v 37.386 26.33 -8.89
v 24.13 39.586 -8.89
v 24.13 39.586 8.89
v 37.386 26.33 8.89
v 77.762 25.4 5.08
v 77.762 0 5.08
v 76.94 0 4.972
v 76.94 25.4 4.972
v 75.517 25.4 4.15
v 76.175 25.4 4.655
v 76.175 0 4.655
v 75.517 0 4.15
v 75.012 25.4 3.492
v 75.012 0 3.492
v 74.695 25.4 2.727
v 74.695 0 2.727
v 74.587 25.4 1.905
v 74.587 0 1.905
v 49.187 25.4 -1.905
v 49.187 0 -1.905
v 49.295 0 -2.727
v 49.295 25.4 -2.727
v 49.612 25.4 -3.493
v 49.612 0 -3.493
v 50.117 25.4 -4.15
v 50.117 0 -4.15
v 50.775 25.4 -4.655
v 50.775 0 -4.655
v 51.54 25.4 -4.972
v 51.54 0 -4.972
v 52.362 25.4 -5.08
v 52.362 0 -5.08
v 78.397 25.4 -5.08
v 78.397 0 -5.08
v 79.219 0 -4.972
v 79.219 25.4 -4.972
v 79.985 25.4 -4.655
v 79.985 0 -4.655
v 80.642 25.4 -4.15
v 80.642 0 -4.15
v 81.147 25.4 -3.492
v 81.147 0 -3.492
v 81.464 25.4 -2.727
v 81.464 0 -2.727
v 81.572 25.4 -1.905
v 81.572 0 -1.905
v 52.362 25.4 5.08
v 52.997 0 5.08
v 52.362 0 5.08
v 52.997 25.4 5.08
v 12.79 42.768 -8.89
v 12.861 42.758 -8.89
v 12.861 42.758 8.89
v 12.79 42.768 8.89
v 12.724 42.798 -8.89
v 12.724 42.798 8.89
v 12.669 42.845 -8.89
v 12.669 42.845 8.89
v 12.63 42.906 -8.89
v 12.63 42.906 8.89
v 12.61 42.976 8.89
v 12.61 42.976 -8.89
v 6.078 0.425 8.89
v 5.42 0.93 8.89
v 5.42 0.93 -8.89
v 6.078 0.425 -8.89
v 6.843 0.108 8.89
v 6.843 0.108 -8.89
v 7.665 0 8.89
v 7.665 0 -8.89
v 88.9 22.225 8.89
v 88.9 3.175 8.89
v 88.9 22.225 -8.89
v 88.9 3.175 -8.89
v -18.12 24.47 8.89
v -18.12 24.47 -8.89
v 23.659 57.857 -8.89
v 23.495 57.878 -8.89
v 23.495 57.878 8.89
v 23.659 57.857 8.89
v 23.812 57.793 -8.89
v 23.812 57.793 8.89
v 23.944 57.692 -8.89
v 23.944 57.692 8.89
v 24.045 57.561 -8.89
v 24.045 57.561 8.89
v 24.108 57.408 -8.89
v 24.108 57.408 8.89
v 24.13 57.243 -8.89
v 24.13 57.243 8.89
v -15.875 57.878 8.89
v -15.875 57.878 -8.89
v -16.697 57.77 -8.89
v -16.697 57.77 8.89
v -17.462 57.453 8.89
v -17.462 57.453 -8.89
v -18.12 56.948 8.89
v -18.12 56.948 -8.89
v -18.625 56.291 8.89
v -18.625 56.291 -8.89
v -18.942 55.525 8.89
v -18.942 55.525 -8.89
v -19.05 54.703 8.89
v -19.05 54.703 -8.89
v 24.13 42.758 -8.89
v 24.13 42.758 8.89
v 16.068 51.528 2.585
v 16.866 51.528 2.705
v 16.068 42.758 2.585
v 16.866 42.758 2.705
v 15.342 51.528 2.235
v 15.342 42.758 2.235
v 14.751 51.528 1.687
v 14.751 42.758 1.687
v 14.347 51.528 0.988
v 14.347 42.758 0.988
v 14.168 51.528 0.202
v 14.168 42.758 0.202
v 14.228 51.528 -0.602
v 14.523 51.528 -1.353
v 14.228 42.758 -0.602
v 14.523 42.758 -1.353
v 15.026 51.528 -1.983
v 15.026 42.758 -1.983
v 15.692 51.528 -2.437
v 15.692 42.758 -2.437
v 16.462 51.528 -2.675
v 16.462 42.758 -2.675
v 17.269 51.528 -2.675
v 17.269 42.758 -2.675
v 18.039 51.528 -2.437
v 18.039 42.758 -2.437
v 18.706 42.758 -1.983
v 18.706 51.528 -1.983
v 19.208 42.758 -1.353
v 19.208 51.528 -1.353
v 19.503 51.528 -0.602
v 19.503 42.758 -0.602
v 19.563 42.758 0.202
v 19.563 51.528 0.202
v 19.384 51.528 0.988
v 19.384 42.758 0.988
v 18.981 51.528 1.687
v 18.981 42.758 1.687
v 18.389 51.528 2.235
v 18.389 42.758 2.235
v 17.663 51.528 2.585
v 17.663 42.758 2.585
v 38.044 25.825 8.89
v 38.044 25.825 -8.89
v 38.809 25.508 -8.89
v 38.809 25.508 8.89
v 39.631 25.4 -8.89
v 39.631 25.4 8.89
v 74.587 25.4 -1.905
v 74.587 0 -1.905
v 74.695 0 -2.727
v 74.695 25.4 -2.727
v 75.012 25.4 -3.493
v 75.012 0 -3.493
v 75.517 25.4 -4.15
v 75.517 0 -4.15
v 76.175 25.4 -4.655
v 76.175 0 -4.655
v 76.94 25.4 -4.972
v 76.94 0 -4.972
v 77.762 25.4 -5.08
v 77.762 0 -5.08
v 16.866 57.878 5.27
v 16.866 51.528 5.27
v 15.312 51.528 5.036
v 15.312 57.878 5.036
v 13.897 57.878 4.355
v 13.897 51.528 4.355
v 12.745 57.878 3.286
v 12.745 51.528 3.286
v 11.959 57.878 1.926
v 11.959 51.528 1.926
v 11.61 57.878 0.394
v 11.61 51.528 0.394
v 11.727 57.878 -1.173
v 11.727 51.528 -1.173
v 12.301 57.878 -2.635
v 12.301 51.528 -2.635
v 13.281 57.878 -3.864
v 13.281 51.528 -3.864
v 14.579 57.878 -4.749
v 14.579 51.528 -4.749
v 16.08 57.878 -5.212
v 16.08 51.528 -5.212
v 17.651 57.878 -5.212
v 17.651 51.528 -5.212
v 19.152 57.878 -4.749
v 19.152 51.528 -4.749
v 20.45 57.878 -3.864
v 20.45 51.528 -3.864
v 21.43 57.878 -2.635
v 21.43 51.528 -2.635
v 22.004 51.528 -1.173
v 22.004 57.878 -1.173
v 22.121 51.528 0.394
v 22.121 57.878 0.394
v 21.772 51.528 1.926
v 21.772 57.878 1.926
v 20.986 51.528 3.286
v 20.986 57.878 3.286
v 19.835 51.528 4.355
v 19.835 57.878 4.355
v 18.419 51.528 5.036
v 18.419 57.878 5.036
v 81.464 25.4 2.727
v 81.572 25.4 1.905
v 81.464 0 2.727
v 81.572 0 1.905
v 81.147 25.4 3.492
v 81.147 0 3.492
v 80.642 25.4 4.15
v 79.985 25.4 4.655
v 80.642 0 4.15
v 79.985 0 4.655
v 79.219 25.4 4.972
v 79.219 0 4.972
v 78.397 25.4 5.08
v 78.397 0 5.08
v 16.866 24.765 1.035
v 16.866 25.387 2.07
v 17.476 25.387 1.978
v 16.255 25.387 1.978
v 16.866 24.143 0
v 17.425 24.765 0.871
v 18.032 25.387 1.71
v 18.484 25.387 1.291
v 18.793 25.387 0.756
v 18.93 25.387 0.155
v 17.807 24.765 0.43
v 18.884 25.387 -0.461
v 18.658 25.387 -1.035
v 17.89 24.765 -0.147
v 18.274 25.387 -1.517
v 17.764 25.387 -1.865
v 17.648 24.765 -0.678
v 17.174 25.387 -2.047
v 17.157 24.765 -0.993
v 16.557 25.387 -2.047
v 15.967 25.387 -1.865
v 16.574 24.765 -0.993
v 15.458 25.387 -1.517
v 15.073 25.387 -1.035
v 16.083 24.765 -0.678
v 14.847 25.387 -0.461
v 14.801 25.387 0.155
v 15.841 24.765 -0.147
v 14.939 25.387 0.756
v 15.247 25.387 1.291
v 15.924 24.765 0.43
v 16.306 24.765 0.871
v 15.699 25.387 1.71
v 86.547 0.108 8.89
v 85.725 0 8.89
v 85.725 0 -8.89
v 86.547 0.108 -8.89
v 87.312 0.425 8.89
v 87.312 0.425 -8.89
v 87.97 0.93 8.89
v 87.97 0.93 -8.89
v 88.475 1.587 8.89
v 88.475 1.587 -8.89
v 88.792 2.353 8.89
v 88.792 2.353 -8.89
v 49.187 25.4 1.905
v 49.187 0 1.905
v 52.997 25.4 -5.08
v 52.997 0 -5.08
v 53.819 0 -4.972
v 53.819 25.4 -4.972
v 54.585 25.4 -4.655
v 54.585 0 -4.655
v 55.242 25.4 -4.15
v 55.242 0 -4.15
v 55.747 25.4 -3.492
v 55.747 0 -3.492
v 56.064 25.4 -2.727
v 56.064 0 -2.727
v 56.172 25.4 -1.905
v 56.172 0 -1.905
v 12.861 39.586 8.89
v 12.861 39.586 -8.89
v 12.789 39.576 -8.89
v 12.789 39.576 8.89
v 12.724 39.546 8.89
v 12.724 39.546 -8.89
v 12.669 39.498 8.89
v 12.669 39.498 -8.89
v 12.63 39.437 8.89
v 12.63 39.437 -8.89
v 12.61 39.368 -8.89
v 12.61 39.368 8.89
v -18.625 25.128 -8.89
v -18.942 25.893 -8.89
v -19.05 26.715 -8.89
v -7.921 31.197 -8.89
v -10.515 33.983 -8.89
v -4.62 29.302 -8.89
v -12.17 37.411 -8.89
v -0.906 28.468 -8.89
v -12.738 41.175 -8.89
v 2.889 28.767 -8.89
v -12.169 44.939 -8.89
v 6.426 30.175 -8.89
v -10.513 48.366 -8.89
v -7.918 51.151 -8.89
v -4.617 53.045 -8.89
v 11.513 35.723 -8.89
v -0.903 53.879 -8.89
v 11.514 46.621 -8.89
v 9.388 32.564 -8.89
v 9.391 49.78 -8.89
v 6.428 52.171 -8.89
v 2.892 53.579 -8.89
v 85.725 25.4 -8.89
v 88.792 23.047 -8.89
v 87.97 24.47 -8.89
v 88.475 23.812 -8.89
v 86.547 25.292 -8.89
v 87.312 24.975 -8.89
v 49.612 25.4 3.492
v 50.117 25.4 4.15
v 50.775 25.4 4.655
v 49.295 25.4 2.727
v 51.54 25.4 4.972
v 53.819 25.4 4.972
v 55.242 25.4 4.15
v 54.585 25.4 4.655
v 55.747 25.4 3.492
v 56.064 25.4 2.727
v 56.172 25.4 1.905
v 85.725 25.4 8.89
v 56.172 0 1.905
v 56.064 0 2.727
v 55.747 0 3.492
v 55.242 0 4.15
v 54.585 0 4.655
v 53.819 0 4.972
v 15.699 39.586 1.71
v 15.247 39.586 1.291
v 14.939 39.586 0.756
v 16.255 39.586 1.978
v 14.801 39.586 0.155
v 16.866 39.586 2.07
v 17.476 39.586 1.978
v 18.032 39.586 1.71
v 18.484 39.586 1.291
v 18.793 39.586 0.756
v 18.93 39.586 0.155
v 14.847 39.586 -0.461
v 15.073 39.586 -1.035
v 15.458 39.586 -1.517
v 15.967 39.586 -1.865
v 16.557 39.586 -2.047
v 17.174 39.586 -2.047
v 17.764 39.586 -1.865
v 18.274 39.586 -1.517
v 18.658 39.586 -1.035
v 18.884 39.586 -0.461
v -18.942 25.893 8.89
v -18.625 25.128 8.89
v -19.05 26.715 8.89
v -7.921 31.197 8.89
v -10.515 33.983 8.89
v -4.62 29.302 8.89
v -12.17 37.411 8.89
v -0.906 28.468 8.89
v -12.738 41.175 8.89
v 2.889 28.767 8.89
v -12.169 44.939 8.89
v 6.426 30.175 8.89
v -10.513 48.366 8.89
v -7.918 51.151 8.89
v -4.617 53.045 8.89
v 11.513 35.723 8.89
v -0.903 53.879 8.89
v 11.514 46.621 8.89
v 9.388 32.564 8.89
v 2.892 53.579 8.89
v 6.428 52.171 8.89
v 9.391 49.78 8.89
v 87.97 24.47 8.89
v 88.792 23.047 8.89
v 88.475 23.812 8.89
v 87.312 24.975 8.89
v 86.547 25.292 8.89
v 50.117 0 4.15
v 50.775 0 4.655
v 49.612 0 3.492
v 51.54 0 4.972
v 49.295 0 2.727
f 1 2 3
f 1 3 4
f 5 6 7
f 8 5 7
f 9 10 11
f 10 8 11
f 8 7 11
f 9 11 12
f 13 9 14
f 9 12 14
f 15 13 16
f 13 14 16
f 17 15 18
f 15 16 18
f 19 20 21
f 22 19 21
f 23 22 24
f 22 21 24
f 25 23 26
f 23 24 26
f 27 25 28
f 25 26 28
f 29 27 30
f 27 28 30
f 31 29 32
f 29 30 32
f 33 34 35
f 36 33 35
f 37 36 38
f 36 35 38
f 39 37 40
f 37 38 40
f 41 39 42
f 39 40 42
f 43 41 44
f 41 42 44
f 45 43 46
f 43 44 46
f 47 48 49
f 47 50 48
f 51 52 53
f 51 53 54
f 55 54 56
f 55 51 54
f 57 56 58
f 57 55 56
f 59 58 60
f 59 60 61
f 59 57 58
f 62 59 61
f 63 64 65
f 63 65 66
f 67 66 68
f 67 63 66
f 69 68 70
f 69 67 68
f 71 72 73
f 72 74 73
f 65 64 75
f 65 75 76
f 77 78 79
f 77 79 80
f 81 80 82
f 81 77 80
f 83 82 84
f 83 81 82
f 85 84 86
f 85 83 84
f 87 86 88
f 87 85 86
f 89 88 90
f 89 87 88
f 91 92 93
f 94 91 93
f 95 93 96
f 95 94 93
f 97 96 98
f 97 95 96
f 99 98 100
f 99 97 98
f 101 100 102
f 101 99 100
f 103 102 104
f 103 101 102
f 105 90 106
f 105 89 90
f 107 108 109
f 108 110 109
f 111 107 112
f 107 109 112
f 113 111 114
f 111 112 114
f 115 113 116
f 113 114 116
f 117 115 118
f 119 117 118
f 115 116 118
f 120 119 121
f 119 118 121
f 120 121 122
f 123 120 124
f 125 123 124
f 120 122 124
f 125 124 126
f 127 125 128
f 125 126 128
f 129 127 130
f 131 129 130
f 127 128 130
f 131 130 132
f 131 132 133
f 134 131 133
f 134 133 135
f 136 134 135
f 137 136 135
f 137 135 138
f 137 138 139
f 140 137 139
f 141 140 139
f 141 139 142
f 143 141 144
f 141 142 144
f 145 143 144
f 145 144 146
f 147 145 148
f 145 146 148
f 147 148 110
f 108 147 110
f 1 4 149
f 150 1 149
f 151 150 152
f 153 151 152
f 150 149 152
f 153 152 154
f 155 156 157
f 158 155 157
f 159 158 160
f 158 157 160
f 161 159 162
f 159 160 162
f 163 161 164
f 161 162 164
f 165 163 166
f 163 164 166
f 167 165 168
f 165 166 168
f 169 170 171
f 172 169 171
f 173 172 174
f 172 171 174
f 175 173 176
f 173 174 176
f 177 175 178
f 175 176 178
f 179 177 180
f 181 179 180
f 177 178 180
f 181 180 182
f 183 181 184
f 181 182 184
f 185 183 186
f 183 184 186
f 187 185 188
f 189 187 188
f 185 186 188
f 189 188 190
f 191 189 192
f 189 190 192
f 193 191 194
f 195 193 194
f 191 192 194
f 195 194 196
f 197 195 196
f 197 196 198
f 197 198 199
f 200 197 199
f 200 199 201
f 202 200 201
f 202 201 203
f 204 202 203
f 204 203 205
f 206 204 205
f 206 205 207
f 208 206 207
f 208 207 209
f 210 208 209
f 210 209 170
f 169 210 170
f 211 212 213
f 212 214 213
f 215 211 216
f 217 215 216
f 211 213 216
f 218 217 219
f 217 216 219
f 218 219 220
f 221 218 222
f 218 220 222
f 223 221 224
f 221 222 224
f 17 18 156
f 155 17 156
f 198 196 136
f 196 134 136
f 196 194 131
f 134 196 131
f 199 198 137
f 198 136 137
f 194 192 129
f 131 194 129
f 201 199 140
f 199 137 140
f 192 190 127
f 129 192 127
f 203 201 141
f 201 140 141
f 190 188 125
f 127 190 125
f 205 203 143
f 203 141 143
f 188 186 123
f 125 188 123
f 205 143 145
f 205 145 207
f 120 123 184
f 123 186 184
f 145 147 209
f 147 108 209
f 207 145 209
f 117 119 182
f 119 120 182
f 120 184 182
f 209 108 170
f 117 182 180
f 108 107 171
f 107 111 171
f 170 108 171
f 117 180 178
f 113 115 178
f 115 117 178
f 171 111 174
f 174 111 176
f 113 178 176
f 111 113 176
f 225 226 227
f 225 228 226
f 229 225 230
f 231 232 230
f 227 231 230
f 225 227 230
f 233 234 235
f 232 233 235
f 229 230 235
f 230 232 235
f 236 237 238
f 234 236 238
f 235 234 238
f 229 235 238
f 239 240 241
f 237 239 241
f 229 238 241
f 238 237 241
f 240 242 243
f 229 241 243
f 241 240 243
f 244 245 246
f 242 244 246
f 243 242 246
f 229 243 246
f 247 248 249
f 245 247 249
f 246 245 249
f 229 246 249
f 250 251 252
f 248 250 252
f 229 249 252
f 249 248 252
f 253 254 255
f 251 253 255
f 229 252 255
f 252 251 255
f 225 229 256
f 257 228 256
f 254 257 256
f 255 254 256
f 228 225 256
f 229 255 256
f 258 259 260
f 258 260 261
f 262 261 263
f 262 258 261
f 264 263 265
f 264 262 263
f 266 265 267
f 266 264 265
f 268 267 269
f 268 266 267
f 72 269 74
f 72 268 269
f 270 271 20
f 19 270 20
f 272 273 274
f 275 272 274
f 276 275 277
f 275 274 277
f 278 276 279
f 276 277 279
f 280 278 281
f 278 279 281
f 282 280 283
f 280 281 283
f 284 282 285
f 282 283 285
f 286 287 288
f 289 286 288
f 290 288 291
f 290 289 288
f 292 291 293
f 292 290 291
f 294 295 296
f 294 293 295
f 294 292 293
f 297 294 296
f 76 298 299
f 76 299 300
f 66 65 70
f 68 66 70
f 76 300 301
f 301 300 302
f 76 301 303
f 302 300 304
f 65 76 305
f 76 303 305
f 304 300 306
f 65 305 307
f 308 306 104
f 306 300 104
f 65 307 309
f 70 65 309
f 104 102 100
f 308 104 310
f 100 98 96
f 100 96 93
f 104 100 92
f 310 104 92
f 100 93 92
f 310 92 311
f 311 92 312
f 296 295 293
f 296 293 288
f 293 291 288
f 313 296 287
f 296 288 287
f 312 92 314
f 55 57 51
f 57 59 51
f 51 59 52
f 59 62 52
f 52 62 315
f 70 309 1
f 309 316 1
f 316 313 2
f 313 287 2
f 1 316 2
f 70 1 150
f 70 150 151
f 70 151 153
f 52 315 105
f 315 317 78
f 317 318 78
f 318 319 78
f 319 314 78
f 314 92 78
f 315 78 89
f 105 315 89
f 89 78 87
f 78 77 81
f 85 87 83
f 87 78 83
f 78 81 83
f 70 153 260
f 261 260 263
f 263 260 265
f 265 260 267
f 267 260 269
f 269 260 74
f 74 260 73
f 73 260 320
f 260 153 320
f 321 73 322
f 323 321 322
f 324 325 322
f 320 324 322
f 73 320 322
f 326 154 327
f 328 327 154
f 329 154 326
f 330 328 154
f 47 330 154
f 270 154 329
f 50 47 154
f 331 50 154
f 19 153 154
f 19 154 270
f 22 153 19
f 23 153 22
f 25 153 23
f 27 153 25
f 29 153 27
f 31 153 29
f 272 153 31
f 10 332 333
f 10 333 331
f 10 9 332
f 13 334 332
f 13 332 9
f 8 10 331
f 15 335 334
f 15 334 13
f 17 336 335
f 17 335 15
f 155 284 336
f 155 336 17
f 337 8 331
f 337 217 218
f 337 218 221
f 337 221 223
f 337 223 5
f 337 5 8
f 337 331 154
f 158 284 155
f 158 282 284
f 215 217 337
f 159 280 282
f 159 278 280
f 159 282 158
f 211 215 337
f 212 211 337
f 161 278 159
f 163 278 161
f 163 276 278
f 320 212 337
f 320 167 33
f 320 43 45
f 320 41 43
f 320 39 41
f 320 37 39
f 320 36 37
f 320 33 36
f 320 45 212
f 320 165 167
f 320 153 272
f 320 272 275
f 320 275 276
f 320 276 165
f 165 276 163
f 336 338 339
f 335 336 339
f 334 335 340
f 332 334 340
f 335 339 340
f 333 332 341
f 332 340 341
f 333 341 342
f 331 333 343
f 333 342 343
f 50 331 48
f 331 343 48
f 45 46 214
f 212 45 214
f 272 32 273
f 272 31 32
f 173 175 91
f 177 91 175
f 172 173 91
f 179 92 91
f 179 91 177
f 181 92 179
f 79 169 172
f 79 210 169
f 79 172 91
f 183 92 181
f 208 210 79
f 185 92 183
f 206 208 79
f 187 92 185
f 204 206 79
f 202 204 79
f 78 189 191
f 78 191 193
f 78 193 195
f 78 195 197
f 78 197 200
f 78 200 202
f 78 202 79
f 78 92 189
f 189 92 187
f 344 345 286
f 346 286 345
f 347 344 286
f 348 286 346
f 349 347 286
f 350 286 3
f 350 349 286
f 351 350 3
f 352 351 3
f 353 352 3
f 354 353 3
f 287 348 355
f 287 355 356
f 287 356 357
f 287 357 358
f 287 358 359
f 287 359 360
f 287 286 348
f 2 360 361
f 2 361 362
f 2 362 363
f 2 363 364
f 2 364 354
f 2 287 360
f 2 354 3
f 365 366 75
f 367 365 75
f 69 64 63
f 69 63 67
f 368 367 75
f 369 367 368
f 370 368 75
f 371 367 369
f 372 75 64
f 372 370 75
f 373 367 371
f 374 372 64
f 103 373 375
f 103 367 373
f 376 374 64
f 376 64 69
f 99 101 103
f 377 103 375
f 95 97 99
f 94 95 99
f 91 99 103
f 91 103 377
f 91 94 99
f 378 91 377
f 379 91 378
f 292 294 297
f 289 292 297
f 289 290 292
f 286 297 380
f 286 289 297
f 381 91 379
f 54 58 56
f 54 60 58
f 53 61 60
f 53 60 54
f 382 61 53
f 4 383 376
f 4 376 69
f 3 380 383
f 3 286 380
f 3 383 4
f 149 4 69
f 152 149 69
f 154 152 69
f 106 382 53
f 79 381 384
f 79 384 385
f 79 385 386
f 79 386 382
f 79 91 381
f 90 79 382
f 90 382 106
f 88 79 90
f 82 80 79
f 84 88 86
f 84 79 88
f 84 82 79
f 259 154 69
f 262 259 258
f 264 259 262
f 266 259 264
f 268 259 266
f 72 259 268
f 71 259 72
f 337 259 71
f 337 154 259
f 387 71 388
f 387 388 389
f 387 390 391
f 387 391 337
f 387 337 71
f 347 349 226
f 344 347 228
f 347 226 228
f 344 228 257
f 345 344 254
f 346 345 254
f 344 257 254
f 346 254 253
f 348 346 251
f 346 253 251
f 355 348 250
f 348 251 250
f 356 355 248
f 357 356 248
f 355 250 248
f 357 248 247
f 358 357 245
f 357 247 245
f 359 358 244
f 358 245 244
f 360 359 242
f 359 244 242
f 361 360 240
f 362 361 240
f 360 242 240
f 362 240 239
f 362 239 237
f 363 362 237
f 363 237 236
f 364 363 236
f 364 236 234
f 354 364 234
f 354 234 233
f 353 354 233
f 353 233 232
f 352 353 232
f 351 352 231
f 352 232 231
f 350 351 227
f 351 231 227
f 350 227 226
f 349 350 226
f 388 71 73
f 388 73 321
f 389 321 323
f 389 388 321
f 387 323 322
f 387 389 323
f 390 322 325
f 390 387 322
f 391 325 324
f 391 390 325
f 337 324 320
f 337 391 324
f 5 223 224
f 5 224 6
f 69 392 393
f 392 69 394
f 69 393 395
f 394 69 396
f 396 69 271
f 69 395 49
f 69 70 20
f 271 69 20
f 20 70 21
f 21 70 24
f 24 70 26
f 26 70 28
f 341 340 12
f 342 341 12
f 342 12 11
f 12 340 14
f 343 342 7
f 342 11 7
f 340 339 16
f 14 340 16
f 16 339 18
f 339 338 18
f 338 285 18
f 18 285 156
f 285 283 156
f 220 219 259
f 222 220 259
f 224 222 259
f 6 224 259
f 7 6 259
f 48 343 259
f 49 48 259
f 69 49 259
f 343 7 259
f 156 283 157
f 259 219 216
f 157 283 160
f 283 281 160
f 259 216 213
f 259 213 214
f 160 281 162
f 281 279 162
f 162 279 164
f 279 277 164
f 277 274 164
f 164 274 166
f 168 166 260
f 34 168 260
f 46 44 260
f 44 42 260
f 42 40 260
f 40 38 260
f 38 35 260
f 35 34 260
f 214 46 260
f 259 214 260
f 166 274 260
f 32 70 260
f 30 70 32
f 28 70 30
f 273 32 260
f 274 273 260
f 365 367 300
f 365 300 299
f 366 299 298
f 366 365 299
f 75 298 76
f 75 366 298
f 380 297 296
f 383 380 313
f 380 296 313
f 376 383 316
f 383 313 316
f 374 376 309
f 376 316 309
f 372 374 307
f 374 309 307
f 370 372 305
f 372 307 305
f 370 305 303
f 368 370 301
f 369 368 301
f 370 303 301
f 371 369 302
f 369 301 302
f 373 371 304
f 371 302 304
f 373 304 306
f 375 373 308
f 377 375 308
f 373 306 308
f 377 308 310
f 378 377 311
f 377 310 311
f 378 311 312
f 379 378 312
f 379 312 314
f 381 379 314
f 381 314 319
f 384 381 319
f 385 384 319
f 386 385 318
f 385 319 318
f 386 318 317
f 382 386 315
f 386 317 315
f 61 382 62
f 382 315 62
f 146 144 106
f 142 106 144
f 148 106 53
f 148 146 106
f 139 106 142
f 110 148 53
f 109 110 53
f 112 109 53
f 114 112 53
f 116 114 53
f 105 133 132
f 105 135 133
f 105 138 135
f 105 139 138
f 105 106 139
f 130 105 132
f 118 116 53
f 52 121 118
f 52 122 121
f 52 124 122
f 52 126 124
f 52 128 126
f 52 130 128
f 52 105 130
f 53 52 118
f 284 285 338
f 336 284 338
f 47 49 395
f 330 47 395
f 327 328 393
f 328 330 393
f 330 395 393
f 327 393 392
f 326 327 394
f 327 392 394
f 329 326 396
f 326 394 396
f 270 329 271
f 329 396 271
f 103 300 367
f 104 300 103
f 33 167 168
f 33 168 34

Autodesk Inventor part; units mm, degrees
ref_plane "YZ Plane" through (0, 0, 0) normal (1, 0, 0) x (0, 1, 0)
sketch "Sketch1" plane through (0, 0, 0) normal (0, 0, 1) x (1, 0, 0)
  line L0 (0, 71.9938) -> (0, -26.8156) projected
  line L1 (-40.64, 0) -> (110.49, 0) projected
  line L2 (-19.05, 0) -> (-19.05, 57.8782)
  line L3 (24.13, 57.8782) -> (24.13, 39.5859)
  line L4 (-19.05, 0) -> (88.9, 0)
  line L5 (88.9, 0) -> (88.9, 25.4)
  line L6 (0, 41.1734) -> (24.13, 41.1734) construction
  line L7 (12.6388, 39.5859) -> (24.13, 39.5859)
  line L8 (24.13, 39.5859) -> (24.13, 42.7577)
  line L9 (24.13, 42.7577) -> (12.6392, 42.7577)
  line L10 (4.9628, 39.5889) -> (24.13, 42.7577) construction
  line L11 (24.13, 39.5859) -> (4.9638, 42.7609) construction
  line L12 (39.9796, 0) -> (88.9, 0) construction
  line L13 (88.9, 0) -> (88.9, -12.7) construction
  line L14 (88.9, -12.7) -> (39.9796, -12.7) construction
  line L15 (39.9796, -12.7) -> (39.9796, 0) construction
  line L16 (52.6796, -12.7) -> (52.6796, 0) construction
  line L17 (78.0796, -12.7) -> (78.0796, 0) construction
  line L18 (38.3159, 25.4) -> (88.9, 25.4)
  line L19 (16.8601, 41.1734) -> (16.8601, 57.8782) construction
  line L20 (12.7635, 41.1734) -> (12.7635, 34.371) construction
  line L21 (24.13, 39.5859) -> (38.3159, 25.4)
  line L22 (-19.05, 57.8782) -> (24.13, 57.8782)
  arc A0 (12.6392, 42.7577) -> (12.6388, 39.5859) centre (0, 41.1734) ccw
  point P0 (14.5469, 41.1734)
  dimension "d1" = 41.1734
  dimension "d3" = 107.95
  dimension "d4" = 25.4
  dimension "d7" = 24.13
  dimension "d13" = 19.05
  dimension "d15" = 39.9796
  dimension "d16" = 0
  dimension "d17" = 12.7
  dimension "d18" = 12.7
  dimension "d19" = 25.4
  dimension "d20" = 52.6796
  dimension "d39" = 16.8601
  dimension "d49" = 135
  dimension "d75" = 12.7381
extrude "Extrusion1" add sketch "Sketch1" along normal mid plane 17.78 contours L22 L3 L9 A0 L0 | L0 A0 L1 L2 L22 | A0 L7 L21 L18 L5 L1 L0
ref_plane "Work Plane1" through (0, 50.8, 0) normal (0, 1, 0) x (-1, 0, 0)
sketch "Sketch2" plane through (0, 50.8, 0) normal (0, 1, 0) x (-1, 0, 0)
  line L0 (0, -7.112) -> (0, 7.112) projected
  line L1 (-97.8865, 0) -> (16.3144, 0) projected
  line L2 (-56.1721, 5.08) -> (-49.1871, 5.08)
  line L3 (-49.1871, 5.08) -> (-49.1871, -5.08)
  line L4 (-49.1871, -5.08) -> (-56.1721, -5.08)
  line L5 (-56.1721, -5.08) -> (-56.1721, 5.08)
  line L6 (-56.1721, 5.08) -> (-49.1871, -5.08) construction
  line L7 (-49.1871, 5.08) -> (-56.1721, -5.08) construction
  line L8 (-81.5721, 5.08) -> (-74.5871, 5.08)
  line L9 (-74.5871, 5.08) -> (-74.5871, -5.08)
  line L10 (-74.5871, -5.08) -> (-81.5721, -5.08)
  line L11 (-81.5721, -5.08) -> (-81.5721, 5.08)
  line L12 (-81.5721, 5.08) -> (-74.5871, -5.08) construction
  line L13 (-74.5871, 5.08) -> (-81.5721, -5.08) construction
  point P0 (0, 0)
  point P1 (-52.6796, 0)
  point P2 (-78.0796, 0)
  dimension "d22" = 52.6796
  dimension "d23" = 25.4
  dimension "d24" = 10.16
  dimension "d25" = 6.985
extrude "Extrusion2" cut sketch "Sketch2" against normal up to next
sketch "Sketch3" plane through (0, 0, 0) normal (0, 0, 1) x (1, 0, 0)
  point P0 (0, 0)
fillet "Fillet1" radius 3.175 8 edges at (49.1871, 12.7, -5.08) (56.1721, 12.7, -5.08) (56.1721, 12.7, 5.08) (49.1871, 12.7, 5.08) (74.5871, 12.7, 5.08) (74.5871, 12.7, -5.08) (81.5721, 12.7, -5.08) (81.5721, 12.7, 5.08)
sketch "Sketch4" plane through (-19.05, 57.8782, 8.89) normal (0, 1, 0) x (1, 0, 0)
  line L0 (129.5216, 7.8564) -> (-21.59, 9.525)
  line L1 (43.18, 19.05) -> (43.18, 0)
  line L2 (19.05, 22.86) -> (19.05, -3.81)
  line L3 (116.9365, 8.89) -> (2.7356, 8.89) projected
  point P0 (19.05, 9.525)
  point P1 (129.5216, 7.8564)
  point P2 (-21.59, 9.525)
  point P3 (35.9156, 8.89)
  dimension "d38" = 16.8656
  dimension "d79" = 0
sketch "Sketch5" plane through (-19.05, 57.8782, 8.89) normal (0, 1, 0) x (1, 0, 0)
  point P0 (19.05, 9.525)
hole "Hole2" at (16.8656, 57.8782, 0) direction (0, -1, 0) diameter 5.4102 end up to surface counterbore diameter 10.541 counterbore depth 6.35
chamfer "Chamfer1" distance 25.4 angle 45 1 edges at (-19.05, 0, 0)
sketch "Sketch6" plane through (0, 0, 0) normal (1, 0, 0) x (0, 1, 0)
  line L0 (41.1734, -12.446) -> (41.1734, 12.446) projected
  line L1 (-11.5756, 0) -> (69.4538, 0) projected
  line L2 (28.4353, -4.7625) -> (28.1813, -4.7625)
  line L3 (28.1813, -4.7625) -> (28.1813, 4.7625)
  line L4 (28.1813, 4.7625) -> (28.4353, 4.7625)
  line L5 (28.4353, 4.7625) -> (28.4353, -4.7625)
  line L6 (28.4353, -4.7625) -> (28.1813, 4.7625) construction
  line L7 (28.1813, -4.7625) -> (28.4353, 4.7625) construction
  line L8 (28.4353, 8.89) -> (28.4353, -8.89) projected
  line L9 (57.8782, -8.89) -> (42.7577, -8.89) projected
  line L10 (42.7577, 8.89) -> (57.8782, 8.89) projected
  point P0 (0, 0)
  point P1 (28.3083, 0)
  dimension "d53" = 0
  dimension "d54" = 9.525
  dimension "d55" = 0.254
  dimension "d56" = 17.78
revolve "Revolution1" [suppressed]
hole "Hole3" at (16.8656, 39.5859, 0) direction (0, -1, 0) diameter 4.1402 depth 14.1986 tip angle 118
fillet "Fillet2" radius 0.254 2 edges at (12.6392, 42.7577, 0) (12.6388, 39.5859, 0)
fillet "Fillet3" radius 0.635 1 edges at (24.13, 57.8782, 0)
fillet "Fillet4" radius 3.175 5 edges at (-19.05, 57.8782, 0) (-19.05, 25.4, 0) (6.35, 0, 0) (88.9, 25.4, 0) (88.9, 0, 0)
chamfer "Chamfer2" [suppressed]
fillet "Fillet5" radius 3.175 1 edges at (38.3159, 25.4, 0)
properties part number "J005363" material "ALUMINUM, 6061-T651"
